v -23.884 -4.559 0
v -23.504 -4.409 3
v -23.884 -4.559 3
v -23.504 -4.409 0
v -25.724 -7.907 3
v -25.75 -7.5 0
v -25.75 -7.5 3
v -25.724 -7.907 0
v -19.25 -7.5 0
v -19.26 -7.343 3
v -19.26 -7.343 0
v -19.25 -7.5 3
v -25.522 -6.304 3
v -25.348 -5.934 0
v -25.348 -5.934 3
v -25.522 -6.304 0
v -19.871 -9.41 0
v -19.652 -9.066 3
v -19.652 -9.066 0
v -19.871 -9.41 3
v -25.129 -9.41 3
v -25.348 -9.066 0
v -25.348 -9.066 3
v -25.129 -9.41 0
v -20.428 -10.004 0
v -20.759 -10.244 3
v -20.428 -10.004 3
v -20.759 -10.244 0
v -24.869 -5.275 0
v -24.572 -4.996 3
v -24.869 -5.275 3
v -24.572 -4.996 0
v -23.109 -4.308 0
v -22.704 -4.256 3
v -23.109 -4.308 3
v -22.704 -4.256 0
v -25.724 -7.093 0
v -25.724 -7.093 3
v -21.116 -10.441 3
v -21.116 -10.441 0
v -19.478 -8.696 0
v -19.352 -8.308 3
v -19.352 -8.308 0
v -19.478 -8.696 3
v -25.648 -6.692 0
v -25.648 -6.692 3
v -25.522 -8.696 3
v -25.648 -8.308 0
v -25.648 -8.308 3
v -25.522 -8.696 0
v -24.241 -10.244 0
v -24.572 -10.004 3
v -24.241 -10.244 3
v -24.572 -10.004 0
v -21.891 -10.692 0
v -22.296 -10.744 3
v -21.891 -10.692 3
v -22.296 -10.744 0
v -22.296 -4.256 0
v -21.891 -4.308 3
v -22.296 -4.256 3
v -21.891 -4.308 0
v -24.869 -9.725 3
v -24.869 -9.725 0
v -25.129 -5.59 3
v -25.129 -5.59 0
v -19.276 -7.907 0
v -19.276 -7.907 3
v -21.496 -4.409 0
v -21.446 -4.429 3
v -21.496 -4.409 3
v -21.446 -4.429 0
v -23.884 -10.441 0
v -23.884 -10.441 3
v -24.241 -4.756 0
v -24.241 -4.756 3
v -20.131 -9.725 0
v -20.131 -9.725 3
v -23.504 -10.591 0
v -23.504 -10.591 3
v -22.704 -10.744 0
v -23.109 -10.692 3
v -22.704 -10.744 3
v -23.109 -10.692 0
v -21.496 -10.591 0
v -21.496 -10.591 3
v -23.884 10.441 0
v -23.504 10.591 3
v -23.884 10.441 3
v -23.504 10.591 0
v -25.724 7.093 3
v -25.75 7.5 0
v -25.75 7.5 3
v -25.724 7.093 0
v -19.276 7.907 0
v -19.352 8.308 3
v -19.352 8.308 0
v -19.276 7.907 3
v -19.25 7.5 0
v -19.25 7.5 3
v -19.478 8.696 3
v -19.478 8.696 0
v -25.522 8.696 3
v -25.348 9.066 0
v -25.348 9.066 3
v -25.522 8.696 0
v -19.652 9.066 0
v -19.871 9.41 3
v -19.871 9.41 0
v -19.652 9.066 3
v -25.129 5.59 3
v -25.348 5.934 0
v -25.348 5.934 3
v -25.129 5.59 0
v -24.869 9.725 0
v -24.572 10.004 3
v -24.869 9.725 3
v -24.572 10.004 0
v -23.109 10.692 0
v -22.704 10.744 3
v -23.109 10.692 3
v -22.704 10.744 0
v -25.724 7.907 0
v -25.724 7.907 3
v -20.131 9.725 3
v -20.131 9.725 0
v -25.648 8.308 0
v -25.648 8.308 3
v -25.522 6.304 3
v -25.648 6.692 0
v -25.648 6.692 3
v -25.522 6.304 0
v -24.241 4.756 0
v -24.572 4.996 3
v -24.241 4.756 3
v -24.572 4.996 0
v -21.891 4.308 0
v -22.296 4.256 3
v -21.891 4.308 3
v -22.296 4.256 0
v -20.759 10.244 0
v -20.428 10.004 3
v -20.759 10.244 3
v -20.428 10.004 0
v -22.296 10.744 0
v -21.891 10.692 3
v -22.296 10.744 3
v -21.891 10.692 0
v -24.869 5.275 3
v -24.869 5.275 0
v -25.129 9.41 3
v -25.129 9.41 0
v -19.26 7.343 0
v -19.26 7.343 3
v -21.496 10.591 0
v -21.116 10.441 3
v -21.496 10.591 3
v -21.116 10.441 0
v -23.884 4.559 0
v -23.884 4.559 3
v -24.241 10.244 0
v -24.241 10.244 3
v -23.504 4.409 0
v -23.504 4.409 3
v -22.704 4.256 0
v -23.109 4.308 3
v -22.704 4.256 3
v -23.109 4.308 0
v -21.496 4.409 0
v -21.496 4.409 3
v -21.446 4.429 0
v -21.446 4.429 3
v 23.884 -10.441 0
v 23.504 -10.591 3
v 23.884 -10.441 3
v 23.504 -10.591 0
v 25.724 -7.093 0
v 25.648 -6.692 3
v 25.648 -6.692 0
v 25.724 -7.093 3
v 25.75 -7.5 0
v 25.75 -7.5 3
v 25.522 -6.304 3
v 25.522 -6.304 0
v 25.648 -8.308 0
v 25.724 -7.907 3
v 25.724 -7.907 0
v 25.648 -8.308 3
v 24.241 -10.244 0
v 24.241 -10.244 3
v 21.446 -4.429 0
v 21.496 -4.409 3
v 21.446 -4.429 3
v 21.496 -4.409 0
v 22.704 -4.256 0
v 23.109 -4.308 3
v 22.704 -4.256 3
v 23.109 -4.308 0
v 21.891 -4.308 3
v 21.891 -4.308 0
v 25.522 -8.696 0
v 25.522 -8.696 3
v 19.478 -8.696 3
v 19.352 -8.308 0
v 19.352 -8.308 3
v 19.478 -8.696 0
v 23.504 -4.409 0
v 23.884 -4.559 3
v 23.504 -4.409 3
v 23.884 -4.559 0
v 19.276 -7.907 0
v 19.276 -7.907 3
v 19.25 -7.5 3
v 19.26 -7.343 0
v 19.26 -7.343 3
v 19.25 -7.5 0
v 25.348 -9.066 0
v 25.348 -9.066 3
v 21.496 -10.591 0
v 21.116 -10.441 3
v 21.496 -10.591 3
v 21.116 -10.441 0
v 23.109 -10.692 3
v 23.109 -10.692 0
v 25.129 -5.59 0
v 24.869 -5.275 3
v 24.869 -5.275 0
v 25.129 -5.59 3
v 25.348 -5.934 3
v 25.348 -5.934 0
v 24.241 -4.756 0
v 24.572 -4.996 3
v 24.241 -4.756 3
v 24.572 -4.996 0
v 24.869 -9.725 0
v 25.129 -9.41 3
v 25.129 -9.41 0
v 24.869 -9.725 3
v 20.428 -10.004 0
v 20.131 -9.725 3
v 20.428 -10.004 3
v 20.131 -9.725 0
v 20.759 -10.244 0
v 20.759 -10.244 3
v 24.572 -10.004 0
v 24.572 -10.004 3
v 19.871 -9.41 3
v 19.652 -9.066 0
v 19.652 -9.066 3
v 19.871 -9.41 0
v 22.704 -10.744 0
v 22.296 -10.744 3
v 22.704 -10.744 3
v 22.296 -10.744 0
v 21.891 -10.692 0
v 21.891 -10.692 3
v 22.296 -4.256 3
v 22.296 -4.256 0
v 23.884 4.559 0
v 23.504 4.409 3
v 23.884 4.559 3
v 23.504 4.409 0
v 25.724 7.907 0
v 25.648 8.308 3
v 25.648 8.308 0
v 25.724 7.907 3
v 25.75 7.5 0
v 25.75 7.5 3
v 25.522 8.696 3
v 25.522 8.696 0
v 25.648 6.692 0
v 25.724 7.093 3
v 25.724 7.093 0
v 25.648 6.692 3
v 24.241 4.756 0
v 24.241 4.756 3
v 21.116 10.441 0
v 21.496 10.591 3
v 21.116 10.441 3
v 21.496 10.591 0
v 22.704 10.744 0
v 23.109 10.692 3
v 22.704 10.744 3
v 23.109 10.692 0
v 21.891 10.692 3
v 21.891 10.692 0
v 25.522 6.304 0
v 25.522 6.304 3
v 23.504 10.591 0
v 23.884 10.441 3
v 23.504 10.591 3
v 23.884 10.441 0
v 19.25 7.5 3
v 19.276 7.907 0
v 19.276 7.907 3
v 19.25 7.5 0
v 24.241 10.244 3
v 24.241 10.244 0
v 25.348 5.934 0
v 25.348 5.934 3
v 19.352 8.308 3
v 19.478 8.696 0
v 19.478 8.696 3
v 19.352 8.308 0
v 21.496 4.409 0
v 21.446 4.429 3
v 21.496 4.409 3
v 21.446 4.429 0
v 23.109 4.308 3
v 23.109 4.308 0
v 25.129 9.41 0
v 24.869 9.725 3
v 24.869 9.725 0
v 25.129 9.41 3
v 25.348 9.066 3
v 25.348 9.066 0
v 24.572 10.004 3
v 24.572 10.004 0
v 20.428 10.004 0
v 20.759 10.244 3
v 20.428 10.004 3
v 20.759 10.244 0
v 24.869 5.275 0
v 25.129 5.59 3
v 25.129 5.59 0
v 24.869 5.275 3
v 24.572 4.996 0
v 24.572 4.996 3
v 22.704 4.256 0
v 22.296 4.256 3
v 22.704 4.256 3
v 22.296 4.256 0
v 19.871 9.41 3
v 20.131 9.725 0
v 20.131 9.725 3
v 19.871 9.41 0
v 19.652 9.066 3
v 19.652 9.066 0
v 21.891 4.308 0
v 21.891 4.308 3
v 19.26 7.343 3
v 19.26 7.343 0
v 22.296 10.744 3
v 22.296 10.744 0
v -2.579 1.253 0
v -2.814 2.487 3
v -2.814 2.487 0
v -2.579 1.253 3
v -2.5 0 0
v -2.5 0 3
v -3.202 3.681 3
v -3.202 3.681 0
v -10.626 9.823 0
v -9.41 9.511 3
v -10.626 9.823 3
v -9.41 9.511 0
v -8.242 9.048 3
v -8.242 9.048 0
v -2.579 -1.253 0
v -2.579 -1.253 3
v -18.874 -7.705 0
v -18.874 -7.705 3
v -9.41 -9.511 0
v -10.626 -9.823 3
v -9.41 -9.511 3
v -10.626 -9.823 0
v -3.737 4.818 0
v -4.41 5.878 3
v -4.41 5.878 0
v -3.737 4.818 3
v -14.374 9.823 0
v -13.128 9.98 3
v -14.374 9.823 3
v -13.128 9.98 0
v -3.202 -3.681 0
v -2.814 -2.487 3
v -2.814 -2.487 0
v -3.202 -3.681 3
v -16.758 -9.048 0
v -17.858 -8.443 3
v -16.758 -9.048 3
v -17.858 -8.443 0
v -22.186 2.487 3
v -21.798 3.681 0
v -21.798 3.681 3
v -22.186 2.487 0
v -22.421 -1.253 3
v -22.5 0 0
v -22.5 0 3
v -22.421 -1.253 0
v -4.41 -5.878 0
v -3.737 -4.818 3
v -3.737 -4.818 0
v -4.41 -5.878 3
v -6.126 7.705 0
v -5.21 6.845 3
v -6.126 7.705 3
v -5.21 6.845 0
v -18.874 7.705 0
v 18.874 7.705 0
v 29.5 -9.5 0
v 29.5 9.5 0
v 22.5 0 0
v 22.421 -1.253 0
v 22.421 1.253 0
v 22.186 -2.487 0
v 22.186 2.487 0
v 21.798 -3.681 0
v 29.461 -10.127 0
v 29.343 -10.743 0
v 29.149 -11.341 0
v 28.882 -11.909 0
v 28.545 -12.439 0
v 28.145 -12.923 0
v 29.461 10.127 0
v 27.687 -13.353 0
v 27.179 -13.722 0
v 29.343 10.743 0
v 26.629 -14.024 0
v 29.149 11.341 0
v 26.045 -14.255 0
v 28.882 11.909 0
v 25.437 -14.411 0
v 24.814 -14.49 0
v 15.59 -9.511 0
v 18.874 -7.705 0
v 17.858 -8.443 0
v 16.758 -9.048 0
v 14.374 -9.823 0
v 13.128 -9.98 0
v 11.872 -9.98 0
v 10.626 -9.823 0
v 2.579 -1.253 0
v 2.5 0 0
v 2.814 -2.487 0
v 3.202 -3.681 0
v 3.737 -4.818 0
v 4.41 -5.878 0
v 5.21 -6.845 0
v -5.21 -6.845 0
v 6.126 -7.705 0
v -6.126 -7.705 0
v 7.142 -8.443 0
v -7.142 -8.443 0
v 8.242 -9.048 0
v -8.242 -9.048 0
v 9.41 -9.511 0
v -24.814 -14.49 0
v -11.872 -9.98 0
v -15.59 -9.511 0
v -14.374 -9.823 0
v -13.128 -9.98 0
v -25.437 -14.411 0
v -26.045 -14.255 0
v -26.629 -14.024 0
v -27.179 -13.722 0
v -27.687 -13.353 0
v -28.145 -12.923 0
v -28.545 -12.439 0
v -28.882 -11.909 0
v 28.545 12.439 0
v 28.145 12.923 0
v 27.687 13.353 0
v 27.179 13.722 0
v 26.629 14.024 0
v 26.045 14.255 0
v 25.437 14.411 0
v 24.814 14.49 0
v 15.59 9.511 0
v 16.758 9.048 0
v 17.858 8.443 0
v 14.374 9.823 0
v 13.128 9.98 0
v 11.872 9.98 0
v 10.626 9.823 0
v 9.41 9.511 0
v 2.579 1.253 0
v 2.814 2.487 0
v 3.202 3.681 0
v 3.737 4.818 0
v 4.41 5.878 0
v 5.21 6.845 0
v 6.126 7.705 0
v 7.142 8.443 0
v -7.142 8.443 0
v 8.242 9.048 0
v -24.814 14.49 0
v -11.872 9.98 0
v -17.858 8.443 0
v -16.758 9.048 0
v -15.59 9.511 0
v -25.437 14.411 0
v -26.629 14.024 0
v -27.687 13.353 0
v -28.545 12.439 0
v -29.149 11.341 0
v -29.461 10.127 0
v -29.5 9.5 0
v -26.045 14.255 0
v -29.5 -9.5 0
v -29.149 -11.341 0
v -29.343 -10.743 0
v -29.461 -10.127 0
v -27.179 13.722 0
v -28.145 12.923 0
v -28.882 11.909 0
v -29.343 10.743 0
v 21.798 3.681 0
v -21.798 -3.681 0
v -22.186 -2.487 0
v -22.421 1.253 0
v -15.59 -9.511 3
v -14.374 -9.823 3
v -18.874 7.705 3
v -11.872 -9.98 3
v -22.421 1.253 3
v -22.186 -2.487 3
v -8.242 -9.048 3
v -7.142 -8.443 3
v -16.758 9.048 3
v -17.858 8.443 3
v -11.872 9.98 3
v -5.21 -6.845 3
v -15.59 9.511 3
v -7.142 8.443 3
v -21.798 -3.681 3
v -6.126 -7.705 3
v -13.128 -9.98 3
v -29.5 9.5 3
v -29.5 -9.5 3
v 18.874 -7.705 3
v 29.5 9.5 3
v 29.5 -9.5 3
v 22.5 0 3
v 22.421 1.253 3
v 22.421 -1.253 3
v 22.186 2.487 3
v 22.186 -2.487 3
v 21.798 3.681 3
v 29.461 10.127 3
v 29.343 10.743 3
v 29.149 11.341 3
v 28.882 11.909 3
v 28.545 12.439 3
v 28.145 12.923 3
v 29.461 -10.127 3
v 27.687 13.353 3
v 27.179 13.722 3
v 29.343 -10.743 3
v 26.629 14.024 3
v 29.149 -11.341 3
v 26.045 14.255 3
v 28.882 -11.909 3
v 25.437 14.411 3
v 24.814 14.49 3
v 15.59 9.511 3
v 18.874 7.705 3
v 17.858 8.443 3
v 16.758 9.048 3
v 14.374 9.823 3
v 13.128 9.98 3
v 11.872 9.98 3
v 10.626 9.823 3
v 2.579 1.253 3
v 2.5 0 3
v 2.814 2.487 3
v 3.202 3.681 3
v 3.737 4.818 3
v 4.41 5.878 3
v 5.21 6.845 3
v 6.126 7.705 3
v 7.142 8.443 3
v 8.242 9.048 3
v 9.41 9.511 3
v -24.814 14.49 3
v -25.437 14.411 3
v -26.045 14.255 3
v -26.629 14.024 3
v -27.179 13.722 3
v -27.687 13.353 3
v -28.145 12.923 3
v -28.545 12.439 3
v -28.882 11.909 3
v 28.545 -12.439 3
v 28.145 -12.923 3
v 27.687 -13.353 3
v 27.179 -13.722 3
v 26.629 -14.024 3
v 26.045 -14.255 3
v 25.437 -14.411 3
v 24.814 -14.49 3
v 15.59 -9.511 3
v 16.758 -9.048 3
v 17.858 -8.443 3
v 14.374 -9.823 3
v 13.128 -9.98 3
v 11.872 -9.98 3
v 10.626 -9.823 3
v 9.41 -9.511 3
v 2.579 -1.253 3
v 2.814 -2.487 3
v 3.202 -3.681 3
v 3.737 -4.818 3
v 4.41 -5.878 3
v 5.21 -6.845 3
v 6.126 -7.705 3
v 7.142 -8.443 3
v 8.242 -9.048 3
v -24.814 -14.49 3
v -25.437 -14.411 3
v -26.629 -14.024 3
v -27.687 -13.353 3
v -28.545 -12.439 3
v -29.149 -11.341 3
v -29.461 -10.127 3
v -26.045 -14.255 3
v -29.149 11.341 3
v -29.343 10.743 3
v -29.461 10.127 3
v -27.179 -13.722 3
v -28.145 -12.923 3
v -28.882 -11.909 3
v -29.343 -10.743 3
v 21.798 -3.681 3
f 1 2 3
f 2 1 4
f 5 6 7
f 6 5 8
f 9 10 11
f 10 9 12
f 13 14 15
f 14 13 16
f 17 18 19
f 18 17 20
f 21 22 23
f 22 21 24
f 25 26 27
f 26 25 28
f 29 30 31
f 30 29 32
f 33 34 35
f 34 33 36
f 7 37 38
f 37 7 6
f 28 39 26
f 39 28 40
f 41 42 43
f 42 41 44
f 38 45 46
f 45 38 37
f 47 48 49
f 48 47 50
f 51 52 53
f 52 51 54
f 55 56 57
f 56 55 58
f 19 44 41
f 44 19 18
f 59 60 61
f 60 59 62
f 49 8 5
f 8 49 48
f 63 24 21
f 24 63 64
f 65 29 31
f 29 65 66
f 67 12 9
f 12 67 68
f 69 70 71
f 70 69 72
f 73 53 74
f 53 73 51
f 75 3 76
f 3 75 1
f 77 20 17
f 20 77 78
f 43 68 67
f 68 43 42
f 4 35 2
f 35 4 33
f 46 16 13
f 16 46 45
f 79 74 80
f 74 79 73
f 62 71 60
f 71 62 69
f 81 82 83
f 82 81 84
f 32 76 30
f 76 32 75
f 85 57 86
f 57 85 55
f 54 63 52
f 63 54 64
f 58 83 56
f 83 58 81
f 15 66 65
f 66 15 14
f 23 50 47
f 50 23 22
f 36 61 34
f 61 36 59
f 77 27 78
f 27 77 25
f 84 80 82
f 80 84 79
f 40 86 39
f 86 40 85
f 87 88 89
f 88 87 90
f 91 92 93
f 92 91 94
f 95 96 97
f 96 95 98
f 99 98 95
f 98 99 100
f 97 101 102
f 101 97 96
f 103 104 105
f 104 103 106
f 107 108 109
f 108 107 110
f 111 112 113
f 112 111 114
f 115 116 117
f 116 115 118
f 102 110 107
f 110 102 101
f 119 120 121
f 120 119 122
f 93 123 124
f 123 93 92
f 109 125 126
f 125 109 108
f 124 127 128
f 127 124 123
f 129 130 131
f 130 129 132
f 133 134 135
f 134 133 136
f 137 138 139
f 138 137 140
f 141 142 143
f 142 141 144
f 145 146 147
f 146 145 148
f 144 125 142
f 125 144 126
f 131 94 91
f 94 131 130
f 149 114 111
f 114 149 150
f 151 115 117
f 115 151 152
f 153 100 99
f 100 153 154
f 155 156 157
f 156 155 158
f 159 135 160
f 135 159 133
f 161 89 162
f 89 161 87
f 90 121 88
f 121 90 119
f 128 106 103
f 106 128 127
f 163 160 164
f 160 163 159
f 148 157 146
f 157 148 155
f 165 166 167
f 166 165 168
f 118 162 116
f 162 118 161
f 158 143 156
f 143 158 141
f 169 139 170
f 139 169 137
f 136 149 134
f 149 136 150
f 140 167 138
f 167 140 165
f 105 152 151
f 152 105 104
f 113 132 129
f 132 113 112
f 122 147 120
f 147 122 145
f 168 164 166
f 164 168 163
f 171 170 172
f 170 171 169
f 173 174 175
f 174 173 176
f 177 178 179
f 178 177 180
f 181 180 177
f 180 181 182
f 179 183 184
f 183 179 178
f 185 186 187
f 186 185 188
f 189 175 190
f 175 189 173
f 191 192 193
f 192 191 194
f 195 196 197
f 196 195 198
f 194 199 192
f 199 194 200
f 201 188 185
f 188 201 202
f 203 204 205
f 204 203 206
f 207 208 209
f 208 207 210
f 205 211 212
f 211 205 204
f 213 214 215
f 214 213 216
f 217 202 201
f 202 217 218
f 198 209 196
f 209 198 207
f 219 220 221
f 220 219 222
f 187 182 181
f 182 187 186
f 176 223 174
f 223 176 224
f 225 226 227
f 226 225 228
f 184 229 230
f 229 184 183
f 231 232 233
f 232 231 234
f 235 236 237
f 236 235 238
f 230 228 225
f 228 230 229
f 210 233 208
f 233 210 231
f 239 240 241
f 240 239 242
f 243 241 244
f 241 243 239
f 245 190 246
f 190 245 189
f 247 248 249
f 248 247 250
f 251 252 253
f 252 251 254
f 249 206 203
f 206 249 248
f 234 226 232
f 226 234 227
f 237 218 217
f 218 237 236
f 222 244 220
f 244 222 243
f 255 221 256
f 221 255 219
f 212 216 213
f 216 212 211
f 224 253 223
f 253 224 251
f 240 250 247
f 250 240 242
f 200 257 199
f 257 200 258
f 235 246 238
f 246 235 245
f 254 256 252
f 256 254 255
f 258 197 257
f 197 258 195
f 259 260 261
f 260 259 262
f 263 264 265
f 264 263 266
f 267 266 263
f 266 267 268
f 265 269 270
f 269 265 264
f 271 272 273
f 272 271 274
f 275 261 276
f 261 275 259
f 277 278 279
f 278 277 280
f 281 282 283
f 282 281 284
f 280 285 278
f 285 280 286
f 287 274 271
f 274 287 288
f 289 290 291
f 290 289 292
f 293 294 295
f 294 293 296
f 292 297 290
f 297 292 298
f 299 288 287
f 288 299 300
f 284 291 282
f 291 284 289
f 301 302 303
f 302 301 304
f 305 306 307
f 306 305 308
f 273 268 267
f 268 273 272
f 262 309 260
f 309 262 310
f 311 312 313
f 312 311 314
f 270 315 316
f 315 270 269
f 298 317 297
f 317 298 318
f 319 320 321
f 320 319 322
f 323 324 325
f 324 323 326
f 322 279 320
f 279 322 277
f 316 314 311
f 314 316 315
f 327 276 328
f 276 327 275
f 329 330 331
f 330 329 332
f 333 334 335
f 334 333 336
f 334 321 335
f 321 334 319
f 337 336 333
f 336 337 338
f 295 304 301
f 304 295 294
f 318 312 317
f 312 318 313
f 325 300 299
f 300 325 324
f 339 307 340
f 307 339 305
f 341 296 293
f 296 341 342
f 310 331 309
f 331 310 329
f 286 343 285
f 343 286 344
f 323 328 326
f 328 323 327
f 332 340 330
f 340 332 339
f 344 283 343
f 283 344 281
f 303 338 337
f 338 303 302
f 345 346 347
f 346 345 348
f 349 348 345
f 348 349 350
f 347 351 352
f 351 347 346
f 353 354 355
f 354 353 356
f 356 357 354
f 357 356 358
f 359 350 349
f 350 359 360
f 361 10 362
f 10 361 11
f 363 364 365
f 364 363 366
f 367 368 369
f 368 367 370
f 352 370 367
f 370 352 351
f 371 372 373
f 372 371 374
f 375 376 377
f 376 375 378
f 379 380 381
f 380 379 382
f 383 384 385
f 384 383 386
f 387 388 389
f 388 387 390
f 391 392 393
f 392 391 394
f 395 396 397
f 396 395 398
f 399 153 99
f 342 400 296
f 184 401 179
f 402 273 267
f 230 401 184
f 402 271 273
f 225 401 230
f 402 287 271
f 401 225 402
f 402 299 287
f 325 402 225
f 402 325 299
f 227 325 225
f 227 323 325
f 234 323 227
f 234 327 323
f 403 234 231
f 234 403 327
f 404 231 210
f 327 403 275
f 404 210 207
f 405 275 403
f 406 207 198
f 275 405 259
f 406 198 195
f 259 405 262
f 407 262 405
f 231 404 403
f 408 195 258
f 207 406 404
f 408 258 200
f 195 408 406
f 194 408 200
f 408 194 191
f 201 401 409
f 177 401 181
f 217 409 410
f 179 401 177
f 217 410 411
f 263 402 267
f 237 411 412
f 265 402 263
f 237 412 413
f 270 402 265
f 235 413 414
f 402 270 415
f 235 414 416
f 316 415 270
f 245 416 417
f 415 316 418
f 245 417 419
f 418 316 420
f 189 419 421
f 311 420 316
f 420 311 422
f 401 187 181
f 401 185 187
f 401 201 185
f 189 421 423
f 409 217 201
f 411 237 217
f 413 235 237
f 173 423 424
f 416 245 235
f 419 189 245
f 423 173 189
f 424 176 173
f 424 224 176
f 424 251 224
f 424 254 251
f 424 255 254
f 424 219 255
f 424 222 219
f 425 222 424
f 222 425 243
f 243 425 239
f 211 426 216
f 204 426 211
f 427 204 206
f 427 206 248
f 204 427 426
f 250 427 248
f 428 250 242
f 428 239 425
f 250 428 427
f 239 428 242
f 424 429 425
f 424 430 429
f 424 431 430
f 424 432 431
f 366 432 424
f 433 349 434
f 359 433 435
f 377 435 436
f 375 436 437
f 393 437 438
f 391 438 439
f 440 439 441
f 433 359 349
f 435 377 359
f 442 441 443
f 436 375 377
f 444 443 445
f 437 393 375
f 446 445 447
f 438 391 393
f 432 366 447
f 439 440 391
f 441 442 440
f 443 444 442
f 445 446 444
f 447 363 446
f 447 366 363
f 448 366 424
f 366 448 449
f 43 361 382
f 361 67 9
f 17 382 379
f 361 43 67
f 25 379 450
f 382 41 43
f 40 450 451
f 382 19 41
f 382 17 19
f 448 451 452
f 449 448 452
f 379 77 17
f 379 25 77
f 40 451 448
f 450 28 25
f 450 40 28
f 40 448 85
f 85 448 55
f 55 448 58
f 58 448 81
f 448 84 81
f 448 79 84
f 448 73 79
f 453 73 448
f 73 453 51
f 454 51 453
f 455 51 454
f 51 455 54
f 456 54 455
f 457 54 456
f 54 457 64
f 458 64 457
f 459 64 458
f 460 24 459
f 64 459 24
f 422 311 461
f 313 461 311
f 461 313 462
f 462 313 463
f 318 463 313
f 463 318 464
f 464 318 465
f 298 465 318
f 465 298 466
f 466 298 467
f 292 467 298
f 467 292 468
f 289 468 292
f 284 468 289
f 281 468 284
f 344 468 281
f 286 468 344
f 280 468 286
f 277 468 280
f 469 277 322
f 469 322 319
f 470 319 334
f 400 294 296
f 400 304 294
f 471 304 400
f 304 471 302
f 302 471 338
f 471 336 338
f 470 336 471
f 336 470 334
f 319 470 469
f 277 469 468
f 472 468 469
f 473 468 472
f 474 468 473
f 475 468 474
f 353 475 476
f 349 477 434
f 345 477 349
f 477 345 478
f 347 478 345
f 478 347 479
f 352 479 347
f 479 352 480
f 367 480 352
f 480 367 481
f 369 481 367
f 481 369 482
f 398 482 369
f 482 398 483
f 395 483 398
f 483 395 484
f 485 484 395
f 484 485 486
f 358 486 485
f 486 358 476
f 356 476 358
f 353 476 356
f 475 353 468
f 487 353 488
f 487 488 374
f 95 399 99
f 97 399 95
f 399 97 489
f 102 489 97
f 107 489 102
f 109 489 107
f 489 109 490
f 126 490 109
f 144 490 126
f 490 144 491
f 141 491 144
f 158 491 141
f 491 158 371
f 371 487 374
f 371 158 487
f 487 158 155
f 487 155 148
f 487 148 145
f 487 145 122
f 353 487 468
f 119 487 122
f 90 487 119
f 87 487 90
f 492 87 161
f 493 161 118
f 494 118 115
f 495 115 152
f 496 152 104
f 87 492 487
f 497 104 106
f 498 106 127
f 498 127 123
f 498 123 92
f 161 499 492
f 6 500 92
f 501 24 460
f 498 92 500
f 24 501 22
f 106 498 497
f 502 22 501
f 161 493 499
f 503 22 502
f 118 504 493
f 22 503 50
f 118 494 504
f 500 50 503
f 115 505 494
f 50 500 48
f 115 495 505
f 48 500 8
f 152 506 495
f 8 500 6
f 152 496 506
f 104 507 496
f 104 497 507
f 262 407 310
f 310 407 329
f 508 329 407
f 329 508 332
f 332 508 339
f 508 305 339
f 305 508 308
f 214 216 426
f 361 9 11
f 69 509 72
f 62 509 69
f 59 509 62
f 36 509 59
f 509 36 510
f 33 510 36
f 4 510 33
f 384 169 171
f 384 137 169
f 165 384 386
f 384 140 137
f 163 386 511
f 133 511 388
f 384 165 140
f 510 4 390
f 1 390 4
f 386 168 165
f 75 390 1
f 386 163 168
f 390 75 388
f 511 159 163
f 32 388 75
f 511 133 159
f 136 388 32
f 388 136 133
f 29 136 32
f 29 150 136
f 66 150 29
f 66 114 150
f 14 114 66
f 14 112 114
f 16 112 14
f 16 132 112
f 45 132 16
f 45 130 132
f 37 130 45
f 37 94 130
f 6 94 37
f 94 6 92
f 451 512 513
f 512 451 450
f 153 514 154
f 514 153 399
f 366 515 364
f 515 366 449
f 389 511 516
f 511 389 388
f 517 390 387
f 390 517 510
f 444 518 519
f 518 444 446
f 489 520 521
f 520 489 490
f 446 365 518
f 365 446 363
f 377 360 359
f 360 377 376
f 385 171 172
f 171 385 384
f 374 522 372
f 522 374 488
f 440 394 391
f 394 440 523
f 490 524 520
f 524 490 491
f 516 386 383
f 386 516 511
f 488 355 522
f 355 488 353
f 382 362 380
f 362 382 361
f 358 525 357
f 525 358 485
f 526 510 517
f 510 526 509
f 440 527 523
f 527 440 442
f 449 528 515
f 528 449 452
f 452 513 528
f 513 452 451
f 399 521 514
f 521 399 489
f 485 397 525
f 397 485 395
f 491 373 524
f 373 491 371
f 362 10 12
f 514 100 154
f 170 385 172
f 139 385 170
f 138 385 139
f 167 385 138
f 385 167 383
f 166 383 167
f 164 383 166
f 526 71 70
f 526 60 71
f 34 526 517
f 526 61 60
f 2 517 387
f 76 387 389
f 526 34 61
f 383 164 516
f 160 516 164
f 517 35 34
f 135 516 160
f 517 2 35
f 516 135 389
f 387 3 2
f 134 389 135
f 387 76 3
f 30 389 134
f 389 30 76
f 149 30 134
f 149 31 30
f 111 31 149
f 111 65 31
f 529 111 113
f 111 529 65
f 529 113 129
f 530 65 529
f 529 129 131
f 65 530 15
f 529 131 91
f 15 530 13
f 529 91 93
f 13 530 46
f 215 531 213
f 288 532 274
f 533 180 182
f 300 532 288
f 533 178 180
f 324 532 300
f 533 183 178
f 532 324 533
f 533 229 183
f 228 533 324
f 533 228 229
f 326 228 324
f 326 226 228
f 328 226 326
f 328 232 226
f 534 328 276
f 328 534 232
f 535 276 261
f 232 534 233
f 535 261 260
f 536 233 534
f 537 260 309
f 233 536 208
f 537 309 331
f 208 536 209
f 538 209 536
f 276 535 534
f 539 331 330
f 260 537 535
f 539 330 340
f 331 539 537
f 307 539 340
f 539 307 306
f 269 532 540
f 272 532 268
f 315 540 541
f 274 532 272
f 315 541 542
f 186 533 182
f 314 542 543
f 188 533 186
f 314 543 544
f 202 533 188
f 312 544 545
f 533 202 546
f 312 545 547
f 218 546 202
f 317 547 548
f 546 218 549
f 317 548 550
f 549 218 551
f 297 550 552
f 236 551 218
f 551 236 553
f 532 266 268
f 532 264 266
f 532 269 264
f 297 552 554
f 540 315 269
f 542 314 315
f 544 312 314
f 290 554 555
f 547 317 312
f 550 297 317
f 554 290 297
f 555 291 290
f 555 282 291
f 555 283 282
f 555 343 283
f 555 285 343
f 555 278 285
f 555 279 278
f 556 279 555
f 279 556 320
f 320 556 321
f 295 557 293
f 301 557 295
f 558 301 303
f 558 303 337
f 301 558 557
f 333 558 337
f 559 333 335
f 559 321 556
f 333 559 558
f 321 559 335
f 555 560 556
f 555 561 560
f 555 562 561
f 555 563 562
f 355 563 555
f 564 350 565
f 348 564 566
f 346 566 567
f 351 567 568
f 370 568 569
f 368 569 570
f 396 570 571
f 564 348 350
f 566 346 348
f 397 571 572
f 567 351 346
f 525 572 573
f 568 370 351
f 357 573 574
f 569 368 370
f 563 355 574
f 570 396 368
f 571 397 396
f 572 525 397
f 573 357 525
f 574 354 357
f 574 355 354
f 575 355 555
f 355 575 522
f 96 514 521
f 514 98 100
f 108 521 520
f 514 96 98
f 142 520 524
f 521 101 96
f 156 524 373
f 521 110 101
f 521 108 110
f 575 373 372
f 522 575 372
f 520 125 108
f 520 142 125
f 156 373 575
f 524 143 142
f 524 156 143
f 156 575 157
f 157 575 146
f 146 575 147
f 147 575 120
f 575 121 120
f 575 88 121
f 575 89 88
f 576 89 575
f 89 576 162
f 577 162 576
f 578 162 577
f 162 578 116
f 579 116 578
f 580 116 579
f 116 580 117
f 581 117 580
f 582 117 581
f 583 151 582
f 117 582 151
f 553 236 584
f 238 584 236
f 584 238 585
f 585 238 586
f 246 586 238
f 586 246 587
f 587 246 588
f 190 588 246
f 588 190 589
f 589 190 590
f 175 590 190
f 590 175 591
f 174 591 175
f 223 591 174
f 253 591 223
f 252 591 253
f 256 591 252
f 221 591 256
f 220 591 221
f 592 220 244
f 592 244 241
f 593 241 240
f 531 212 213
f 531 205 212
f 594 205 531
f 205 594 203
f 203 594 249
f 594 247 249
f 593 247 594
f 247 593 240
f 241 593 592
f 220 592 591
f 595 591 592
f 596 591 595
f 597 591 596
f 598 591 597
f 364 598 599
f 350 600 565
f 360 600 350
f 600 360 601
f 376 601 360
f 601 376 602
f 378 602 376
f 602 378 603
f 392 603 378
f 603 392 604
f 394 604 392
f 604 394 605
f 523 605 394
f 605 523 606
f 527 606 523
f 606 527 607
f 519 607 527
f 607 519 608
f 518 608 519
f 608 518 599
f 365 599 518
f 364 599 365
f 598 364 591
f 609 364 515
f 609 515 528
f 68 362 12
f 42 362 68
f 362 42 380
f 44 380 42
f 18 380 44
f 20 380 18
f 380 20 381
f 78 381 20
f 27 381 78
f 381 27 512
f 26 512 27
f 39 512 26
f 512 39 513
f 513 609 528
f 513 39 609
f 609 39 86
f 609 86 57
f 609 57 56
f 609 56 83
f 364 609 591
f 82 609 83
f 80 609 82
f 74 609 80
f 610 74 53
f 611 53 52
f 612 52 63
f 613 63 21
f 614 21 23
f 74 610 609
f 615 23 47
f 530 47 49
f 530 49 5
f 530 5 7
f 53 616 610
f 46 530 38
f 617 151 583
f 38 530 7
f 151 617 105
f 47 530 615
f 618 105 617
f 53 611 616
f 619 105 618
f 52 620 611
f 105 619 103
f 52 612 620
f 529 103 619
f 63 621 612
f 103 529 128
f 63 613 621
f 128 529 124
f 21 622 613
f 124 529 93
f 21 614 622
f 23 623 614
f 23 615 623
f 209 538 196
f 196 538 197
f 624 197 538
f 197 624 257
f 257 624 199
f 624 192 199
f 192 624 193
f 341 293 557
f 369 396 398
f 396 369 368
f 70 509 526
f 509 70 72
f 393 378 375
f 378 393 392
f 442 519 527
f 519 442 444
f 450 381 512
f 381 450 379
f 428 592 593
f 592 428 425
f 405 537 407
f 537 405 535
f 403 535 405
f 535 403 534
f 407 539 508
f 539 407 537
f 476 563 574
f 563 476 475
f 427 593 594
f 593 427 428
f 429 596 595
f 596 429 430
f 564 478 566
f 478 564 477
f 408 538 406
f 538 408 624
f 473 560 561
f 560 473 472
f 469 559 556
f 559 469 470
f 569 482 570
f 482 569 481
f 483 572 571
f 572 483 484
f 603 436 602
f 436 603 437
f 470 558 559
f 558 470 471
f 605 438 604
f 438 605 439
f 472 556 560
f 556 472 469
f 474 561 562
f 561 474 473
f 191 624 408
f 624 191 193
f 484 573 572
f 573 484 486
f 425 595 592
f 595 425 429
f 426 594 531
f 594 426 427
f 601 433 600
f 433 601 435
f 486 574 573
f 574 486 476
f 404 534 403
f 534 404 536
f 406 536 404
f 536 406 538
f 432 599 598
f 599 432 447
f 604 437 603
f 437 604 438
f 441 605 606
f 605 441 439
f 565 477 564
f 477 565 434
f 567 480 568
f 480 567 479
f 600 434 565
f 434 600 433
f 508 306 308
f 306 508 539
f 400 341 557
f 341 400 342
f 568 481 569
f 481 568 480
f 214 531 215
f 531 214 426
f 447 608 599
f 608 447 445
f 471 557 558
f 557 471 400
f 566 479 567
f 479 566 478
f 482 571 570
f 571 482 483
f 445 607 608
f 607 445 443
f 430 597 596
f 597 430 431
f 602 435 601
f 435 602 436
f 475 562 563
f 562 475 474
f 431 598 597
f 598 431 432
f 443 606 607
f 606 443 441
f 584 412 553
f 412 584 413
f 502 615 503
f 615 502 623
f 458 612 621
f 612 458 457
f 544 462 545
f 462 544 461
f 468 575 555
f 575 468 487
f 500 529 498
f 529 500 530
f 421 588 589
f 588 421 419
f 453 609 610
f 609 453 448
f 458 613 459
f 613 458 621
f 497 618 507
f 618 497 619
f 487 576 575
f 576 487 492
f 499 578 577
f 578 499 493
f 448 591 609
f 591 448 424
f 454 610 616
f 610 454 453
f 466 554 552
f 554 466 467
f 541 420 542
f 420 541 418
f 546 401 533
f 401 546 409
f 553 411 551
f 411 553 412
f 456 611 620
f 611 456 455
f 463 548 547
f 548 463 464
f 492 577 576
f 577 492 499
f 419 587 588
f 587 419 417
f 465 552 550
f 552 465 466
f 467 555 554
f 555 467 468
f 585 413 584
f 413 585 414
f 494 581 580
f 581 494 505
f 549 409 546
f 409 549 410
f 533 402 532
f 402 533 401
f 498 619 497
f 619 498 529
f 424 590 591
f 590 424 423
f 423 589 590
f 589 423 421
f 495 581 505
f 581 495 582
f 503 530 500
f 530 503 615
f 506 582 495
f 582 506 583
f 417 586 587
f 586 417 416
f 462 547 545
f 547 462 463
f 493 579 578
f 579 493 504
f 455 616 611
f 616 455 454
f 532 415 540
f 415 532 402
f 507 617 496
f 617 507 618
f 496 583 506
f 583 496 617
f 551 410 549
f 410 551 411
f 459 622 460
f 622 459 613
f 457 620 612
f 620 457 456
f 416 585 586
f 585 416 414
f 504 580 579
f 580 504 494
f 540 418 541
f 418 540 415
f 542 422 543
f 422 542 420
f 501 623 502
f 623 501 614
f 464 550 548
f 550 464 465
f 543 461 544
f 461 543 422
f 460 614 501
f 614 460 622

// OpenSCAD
$fn = 50;


difference() {
	union() {
		hull() {
			translate(v = [-24.5000000000, 9.5000000000, 0]) {
				cylinder(h = 3, r = 5);
			}
			translate(v = [24.5000000000, 9.5000000000, 0]) {
				cylinder(h = 3, r = 5);
			}
			translate(v = [-24.5000000000, -9.5000000000, 0]) {
				cylinder(h = 3, r = 5);
			}
			translate(v = [24.5000000000, -9.5000000000, 0]) {
				cylinder(h = 3, r = 5);
			}
		}
	}
	union() {
		#translate(v = [-22.5000000000, -7.5000000000, -100.0000000000]) {
			cylinder(h = 200, r = 3.2500000000);
		}
		#translate(v = [-22.5000000000, 7.5000000000, -100.0000000000]) {
			cylinder(h = 200, r = 3.2500000000);
		}
		#translate(v = [22.5000000000, -7.5000000000, -100.0000000000]) {
			cylinder(h = 200, r = 3.2500000000);
		}
		#translate(v = [22.5000000000, 7.5000000000, -100.0000000000]) {
			cylinder(h = 200, r = 3.2500000000);
		}
		#translate(v = [-12.5000000000, 0, 0]) {
			cylinder(h = 3, r = 10.0000000000);
		}
		#translate(v = [12.5000000000, 0, 0]) {
			cylinder(h = 3, r = 10.0000000000);
		}
	}
}
